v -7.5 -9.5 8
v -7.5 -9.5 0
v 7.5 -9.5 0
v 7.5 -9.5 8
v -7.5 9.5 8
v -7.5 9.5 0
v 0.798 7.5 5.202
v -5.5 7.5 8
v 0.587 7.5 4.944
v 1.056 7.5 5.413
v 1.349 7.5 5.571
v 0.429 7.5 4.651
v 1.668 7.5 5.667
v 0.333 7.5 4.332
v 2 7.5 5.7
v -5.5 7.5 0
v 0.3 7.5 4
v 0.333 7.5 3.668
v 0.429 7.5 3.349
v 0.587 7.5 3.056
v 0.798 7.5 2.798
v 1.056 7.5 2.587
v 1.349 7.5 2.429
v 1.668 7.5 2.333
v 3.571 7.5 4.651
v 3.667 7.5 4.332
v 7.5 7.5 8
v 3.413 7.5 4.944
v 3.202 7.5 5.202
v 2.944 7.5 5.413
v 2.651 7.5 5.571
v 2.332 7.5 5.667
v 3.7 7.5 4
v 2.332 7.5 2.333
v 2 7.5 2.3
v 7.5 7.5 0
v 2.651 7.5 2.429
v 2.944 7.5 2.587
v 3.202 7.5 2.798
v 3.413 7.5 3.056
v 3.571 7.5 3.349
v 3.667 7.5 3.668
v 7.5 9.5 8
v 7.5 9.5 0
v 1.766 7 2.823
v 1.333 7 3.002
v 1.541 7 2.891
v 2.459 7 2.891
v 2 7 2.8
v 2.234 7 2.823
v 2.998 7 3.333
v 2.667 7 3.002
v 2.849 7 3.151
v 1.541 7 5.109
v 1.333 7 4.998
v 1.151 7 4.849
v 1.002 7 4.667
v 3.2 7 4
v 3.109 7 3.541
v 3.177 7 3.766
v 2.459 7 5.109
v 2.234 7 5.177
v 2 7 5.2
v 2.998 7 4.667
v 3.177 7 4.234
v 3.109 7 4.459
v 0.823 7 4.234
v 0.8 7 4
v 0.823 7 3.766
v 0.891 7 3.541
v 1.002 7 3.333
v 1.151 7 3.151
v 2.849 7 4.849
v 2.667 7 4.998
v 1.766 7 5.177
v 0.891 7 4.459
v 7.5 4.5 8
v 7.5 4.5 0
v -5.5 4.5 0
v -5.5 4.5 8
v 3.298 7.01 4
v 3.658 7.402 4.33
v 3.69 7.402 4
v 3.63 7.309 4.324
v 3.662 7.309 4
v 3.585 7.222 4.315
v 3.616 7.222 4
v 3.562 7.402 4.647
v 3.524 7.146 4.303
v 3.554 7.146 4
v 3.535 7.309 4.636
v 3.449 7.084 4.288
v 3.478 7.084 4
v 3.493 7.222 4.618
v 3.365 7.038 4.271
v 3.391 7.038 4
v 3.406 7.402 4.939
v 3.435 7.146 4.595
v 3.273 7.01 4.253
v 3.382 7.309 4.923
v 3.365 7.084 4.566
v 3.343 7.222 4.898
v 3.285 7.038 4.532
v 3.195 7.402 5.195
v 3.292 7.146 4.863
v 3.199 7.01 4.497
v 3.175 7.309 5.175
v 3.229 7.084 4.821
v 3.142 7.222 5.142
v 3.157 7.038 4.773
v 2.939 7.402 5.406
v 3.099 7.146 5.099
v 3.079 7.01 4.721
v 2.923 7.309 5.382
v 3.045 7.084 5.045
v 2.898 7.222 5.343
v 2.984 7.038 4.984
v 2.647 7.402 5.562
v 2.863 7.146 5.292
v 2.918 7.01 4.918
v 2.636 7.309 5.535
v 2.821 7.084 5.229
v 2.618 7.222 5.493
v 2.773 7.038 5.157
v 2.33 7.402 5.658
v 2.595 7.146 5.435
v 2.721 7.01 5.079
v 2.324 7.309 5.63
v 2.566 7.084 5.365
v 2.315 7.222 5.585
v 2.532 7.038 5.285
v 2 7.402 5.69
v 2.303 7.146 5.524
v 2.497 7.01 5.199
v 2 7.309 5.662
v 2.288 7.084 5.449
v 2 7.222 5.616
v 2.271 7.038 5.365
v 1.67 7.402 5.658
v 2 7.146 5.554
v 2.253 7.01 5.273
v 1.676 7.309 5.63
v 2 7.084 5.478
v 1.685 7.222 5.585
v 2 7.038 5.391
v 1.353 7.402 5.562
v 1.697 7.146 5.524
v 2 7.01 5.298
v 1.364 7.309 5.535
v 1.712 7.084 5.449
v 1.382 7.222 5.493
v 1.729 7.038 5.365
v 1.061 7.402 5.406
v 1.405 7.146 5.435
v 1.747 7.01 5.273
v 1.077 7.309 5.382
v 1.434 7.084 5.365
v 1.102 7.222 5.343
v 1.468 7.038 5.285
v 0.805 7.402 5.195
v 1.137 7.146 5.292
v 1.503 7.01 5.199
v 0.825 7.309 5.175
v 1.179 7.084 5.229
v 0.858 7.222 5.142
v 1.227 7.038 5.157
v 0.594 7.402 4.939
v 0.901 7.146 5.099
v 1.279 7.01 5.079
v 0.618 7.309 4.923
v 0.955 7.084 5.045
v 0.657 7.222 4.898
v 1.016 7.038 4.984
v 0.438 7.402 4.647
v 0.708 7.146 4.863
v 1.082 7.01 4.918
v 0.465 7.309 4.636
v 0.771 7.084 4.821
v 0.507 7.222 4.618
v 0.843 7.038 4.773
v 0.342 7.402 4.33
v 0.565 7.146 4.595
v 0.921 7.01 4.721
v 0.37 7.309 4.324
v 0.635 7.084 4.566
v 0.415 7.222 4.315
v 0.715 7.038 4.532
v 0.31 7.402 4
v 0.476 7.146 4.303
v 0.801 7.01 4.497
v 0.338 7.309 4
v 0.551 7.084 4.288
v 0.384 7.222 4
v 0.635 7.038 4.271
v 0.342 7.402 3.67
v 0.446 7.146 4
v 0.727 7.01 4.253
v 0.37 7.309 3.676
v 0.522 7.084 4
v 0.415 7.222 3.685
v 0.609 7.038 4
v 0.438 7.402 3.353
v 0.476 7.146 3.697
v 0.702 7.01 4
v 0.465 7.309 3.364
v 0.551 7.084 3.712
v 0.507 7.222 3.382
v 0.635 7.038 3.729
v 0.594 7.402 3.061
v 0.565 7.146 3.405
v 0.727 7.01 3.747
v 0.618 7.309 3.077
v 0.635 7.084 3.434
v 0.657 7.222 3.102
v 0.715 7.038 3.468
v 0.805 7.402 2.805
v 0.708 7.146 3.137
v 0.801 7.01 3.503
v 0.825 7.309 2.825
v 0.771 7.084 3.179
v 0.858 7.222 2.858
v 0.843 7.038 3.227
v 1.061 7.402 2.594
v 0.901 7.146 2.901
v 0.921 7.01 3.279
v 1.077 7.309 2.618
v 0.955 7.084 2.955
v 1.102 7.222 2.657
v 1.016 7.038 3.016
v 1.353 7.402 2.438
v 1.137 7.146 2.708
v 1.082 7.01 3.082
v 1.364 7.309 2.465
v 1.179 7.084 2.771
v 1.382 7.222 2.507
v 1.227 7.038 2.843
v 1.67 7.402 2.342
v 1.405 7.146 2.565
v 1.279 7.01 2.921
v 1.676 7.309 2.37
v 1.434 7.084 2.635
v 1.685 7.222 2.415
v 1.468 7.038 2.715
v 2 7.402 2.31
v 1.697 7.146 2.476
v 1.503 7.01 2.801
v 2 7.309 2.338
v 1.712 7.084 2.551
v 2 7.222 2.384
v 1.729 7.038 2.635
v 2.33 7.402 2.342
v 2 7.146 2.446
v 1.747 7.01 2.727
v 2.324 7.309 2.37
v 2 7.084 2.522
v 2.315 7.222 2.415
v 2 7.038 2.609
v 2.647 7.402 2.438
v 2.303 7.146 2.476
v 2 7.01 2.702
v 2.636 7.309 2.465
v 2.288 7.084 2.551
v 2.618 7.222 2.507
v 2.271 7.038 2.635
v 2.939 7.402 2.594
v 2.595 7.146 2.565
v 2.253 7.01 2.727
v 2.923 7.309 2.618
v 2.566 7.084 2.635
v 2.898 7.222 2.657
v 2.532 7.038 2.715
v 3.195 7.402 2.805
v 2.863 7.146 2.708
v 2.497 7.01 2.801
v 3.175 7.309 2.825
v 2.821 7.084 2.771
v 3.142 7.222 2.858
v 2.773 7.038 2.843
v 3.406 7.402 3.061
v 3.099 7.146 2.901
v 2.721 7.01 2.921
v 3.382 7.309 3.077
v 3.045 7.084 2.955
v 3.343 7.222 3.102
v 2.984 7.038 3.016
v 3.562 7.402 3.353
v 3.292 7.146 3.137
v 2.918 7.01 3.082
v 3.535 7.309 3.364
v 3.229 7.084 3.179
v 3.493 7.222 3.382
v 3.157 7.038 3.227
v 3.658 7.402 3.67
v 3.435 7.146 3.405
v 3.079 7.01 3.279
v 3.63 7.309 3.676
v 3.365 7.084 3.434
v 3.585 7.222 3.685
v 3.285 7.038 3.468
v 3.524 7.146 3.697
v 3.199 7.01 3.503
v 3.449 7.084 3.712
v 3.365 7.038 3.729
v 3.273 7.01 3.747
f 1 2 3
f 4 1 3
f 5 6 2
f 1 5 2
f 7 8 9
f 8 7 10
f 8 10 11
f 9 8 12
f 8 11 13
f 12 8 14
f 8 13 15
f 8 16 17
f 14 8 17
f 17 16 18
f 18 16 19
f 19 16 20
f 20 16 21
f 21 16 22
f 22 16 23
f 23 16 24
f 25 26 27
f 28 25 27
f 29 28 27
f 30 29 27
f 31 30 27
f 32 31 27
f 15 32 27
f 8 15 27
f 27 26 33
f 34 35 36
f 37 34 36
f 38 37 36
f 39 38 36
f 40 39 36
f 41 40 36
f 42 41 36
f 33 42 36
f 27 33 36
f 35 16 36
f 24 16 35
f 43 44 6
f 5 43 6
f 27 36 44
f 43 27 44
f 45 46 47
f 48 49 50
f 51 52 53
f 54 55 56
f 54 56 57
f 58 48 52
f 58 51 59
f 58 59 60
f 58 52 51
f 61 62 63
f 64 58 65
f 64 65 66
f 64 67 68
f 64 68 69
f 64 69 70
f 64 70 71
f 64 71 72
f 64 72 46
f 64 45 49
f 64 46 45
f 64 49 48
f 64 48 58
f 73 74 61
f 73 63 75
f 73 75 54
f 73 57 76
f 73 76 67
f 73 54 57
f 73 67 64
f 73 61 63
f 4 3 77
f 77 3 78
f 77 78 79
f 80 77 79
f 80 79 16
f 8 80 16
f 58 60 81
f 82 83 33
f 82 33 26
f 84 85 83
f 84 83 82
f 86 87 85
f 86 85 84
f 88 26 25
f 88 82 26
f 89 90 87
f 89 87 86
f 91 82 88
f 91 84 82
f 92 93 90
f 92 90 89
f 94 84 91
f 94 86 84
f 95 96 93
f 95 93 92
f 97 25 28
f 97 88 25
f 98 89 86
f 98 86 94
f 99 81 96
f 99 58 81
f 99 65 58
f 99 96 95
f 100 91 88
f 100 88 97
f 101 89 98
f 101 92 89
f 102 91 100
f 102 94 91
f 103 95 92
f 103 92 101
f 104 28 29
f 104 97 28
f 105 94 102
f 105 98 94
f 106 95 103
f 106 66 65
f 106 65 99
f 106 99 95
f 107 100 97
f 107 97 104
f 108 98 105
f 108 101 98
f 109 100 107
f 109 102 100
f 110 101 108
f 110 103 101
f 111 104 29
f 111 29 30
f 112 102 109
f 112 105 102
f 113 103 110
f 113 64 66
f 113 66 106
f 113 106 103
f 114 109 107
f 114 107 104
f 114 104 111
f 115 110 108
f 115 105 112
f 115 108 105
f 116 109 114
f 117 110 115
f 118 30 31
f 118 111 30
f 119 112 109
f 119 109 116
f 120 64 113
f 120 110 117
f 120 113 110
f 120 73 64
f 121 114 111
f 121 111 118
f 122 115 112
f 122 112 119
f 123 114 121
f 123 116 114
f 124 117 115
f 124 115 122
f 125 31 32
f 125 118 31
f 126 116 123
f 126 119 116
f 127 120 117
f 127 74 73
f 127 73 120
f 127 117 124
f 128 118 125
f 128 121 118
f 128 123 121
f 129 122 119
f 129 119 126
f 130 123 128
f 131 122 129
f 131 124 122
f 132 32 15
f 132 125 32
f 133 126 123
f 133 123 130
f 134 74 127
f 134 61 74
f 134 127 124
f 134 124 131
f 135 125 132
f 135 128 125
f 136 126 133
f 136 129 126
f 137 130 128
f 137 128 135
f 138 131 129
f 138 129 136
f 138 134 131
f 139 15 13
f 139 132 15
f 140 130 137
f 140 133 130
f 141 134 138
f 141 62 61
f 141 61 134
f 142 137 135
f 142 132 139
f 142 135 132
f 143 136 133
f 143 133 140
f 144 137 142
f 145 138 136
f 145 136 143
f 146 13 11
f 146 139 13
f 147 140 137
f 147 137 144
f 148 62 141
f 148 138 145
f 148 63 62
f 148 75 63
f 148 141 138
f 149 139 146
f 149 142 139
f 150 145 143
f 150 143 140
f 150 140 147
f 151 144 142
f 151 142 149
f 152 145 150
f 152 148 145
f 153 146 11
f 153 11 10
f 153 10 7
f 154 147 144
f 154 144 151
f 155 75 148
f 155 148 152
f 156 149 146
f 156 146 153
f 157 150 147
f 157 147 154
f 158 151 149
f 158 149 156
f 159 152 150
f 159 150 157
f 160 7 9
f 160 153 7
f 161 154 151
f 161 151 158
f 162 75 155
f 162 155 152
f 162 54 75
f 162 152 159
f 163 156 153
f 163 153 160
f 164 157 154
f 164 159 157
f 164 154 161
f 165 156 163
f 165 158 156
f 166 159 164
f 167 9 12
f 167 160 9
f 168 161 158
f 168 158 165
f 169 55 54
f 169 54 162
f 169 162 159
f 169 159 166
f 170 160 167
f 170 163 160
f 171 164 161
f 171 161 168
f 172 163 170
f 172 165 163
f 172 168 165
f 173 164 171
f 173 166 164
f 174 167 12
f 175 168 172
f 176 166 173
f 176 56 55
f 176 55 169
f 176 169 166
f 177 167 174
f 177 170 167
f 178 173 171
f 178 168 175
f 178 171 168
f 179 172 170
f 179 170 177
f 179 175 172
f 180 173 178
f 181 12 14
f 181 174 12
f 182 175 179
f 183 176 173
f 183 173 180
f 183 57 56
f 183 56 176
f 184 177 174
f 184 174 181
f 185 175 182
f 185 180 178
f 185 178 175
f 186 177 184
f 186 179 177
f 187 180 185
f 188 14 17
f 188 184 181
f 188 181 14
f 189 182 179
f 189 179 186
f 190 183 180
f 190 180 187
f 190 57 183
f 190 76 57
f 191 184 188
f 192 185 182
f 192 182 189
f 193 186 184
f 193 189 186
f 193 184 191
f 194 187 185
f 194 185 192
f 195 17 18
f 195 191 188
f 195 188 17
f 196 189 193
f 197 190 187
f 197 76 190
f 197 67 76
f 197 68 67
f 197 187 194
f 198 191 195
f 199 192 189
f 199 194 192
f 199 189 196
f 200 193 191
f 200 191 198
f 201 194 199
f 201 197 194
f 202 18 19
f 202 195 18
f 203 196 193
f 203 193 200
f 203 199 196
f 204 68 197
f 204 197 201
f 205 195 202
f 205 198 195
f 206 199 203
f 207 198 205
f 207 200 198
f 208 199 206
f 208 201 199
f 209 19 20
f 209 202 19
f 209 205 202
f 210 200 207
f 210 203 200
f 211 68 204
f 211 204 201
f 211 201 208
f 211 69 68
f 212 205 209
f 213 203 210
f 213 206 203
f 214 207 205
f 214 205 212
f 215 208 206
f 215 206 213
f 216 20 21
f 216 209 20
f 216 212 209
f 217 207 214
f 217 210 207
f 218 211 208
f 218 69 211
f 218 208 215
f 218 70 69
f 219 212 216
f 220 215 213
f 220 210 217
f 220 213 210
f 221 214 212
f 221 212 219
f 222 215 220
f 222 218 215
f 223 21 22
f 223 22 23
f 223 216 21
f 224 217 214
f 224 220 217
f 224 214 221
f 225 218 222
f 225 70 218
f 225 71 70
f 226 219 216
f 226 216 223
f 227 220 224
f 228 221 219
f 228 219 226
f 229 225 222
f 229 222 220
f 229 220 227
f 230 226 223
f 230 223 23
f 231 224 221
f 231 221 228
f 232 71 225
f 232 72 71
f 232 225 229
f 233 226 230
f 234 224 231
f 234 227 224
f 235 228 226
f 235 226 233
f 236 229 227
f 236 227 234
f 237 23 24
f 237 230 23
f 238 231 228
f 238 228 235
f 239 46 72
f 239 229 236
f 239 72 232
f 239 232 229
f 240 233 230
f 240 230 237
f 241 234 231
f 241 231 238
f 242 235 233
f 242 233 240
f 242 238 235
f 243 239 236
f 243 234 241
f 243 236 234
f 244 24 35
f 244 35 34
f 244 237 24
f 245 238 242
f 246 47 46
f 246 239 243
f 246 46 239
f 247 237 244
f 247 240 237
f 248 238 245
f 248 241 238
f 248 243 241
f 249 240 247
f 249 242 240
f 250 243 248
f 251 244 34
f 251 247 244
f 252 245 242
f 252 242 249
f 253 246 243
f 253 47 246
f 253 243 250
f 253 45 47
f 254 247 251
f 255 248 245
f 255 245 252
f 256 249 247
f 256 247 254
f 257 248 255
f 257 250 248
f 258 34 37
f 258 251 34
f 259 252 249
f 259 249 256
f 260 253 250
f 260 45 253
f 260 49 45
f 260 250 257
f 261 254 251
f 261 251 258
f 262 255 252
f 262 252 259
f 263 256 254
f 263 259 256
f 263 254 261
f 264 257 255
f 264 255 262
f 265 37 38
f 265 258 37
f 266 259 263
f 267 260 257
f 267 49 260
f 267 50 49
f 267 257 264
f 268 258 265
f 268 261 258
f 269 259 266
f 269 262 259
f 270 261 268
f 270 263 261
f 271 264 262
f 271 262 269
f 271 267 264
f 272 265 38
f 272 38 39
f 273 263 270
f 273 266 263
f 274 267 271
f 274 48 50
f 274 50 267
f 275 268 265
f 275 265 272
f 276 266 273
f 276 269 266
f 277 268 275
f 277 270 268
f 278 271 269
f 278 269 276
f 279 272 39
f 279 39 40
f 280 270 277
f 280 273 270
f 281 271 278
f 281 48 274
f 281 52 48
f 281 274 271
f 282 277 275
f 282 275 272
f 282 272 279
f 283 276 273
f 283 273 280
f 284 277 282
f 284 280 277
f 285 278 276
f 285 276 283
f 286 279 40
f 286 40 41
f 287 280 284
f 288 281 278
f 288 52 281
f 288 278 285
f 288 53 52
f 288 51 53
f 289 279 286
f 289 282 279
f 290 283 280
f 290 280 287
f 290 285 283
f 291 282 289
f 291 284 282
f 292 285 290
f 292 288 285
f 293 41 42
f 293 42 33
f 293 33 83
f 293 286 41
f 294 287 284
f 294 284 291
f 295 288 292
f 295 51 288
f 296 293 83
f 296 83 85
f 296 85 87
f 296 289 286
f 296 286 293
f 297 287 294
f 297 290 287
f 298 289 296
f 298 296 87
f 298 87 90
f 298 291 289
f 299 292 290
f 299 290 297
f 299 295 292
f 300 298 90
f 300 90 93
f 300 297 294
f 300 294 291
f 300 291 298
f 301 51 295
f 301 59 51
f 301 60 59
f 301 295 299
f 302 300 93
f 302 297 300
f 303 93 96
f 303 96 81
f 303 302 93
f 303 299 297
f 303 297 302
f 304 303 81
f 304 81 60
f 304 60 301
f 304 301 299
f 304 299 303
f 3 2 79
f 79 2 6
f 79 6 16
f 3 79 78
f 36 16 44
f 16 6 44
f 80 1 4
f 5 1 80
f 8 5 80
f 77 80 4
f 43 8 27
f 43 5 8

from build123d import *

# Parameters (mm, degrees)
F1_DEPTH = 8
F2_R     = 1.7
F3_DEPTH = 0.5
F4_R     = 0.49999


# Not quite as in the source:
# - a fillet or chamfer is up to 0.001 mm smaller than in the source, because OpenCascade refuses the exact size


with BuildPart() as f1:
    # F0 (on Top) → F1 (new body)
    with BuildSketch(Plane.XY):
        Polygon((-7.5, -9.5), (7.5, -9.5), (7.5, 4.5), (-5.5, 4.5), (-5.5, 7.5), (7.5, 7.5), (7.5, 9.5), (-7.5, 9.5), align=None)
    extrude(amount=F1_DEPTH)

    # F2 (on face) → F3 (join)
    with BuildSketch(Plane.XZ.offset(-7.5)):
        with Locations((2, 4)):
            Circle(F2_R)
    extrude(amount=F3_DEPTH)

    # F4 (radius 0.5 in the source; OpenCascade refuses exactly that, so slightly less here)
    f4_edges = [f1.edges().sort_by_distance(p)[0] for p in [
        (0.3, 7, 4),
    ]]
    fillet(f4_edges, radius=F4_R)


solid = f1.part
